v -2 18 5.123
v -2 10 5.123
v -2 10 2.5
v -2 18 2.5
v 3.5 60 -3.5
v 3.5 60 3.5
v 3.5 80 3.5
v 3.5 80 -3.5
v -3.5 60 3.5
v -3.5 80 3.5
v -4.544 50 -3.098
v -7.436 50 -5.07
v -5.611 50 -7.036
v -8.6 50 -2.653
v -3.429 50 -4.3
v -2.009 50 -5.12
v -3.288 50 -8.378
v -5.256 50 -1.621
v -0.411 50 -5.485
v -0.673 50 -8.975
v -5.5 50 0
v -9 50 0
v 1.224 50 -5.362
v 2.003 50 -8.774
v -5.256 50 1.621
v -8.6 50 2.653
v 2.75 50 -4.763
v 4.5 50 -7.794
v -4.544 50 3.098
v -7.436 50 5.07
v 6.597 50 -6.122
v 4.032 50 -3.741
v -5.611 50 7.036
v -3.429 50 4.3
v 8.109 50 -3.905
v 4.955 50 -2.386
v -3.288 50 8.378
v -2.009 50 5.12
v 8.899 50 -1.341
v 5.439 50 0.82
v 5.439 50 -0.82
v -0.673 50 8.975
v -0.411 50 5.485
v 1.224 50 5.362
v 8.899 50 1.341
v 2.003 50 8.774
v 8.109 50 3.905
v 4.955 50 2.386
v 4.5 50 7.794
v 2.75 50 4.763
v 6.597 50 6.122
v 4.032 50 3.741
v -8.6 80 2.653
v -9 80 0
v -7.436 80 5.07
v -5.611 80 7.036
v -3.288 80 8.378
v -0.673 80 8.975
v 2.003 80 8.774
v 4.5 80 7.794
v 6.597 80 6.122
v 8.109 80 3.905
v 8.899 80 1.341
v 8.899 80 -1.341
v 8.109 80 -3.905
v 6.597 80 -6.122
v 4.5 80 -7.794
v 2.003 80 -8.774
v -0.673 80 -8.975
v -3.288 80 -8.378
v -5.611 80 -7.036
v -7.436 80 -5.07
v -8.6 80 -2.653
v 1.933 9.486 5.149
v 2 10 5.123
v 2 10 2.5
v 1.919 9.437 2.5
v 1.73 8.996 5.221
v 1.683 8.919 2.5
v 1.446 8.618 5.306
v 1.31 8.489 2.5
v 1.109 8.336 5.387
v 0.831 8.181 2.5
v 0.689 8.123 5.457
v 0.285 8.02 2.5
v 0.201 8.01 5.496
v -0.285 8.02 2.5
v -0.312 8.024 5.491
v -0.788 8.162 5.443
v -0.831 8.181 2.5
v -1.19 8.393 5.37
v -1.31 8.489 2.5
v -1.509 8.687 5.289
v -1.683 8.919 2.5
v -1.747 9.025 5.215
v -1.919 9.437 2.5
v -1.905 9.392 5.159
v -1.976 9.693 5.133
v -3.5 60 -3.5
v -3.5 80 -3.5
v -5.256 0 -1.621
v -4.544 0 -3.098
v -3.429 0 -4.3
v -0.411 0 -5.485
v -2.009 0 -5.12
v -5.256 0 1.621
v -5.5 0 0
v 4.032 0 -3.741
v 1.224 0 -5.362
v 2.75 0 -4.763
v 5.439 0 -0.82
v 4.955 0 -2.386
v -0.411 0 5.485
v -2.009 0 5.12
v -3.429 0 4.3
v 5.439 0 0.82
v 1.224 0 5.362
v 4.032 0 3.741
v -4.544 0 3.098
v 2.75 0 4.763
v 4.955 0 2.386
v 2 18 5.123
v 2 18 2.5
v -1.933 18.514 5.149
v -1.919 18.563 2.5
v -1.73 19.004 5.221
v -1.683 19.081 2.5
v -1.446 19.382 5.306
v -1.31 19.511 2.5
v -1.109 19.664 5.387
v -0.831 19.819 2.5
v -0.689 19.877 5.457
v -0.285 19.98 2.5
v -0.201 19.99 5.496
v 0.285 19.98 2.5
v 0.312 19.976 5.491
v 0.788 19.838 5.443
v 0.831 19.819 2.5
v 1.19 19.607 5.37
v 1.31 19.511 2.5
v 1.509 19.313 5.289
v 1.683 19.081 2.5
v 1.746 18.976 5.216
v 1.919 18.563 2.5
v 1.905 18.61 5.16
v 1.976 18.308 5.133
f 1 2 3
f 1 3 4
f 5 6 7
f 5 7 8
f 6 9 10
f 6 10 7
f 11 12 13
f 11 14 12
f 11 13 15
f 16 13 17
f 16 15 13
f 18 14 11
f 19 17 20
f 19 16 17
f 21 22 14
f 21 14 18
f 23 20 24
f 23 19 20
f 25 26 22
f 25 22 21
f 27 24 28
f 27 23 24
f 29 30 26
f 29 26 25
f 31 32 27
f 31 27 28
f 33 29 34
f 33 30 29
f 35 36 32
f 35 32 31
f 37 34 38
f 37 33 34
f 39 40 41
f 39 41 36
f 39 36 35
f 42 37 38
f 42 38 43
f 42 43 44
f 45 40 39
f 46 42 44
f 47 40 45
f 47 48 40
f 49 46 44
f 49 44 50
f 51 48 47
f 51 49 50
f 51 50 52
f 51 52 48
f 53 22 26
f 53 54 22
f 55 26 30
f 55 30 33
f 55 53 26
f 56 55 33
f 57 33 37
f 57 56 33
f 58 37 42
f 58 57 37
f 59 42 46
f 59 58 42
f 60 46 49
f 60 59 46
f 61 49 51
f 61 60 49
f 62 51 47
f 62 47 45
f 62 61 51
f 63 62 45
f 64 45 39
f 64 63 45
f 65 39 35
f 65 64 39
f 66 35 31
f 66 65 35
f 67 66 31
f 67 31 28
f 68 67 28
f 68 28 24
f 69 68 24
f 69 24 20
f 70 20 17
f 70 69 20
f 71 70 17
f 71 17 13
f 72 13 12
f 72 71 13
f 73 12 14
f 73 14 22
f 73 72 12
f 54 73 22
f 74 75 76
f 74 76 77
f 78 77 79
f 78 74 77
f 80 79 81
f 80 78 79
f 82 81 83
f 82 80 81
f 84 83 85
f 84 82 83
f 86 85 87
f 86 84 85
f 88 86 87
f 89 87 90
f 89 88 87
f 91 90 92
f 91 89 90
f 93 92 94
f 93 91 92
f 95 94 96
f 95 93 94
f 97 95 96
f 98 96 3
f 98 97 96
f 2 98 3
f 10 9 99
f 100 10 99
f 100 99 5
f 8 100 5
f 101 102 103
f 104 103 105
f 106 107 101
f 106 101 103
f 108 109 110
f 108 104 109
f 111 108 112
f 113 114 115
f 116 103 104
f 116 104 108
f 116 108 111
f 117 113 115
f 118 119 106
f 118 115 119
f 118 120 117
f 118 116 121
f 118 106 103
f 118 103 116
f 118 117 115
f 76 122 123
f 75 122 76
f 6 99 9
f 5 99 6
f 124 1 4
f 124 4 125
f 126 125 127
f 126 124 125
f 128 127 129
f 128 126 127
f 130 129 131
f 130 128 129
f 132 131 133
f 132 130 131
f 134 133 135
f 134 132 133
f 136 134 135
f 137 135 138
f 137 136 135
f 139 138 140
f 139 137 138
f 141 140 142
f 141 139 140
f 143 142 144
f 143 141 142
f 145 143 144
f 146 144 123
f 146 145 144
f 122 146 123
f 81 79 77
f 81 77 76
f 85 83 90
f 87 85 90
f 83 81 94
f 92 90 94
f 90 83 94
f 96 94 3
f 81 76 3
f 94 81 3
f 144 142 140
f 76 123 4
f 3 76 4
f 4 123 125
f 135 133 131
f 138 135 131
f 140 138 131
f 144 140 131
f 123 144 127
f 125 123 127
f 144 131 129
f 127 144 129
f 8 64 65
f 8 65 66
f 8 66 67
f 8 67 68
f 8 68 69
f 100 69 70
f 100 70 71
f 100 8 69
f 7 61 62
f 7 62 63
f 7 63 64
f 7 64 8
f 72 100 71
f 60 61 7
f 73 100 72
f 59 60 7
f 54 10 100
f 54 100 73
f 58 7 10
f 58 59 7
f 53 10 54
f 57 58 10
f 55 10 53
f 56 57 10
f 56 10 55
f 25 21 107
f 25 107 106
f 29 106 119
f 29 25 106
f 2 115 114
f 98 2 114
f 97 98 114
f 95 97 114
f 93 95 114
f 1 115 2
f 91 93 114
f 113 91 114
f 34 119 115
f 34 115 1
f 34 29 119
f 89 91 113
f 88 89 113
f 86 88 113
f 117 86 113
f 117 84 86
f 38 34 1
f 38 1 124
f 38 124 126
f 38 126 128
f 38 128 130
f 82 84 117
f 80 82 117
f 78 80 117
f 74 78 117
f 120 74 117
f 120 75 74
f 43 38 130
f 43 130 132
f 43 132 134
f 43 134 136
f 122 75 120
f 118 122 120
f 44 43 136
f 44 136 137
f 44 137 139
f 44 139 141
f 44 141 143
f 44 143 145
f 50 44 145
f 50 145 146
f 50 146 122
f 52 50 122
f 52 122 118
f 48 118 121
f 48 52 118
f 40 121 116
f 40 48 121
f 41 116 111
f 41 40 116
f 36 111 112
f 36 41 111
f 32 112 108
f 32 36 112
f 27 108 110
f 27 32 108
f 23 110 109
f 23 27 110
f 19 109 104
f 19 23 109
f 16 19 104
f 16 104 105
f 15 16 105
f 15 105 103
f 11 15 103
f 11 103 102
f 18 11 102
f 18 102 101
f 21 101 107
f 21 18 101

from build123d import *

# Parameters (mm, degrees)
SKETCH_2_W          = 7
SKETCH_2_H          = 7
CUT_EXTRUDE_1_DEPTH = 20
CUT_EXTRUDE_2_DEPTH = 3


with BuildPart() as part:
    # 草图1 → 旋转1 (revolve)
    with BuildSketch(Plane.XY):
        Polygon((0, 0), (-5.5, 0), (-5.5, 50), (-9, 50), (-9, 80), (0, 80), align=None)
    revolve(axis=Axis((0, 0, 0), (0, 1, 0)))

    # 草图2 → 切除-拉伸1 (cut)
    with BuildSketch(Plane(origin=(0, 80, 0), x_dir=(1, 0, 0), z_dir=(0, 1, 0))):
        Rectangle(SKETCH_2_W, SKETCH_2_H)
    extrude(amount=-CUT_EXTRUDE_1_DEPTH, mode=Mode.SUBTRACT)

    # 草图4 → 切除-拉伸2 (cut)
    with BuildSketch(Plane.XY.offset(5.5)):
        with BuildLine():
            Line((-2, 10), (-2, 18))
            ThreePointArc((-2, 18), (0, 20), (2, 18))
            Line((2, 18), (2, 10))
            ThreePointArc((2, 10), (0, 8), (-2, 10))
        make_face()
    extrude(amount=-CUT_EXTRUDE_2_DEPTH, mode=Mode.SUBTRACT)


solid = part.part
